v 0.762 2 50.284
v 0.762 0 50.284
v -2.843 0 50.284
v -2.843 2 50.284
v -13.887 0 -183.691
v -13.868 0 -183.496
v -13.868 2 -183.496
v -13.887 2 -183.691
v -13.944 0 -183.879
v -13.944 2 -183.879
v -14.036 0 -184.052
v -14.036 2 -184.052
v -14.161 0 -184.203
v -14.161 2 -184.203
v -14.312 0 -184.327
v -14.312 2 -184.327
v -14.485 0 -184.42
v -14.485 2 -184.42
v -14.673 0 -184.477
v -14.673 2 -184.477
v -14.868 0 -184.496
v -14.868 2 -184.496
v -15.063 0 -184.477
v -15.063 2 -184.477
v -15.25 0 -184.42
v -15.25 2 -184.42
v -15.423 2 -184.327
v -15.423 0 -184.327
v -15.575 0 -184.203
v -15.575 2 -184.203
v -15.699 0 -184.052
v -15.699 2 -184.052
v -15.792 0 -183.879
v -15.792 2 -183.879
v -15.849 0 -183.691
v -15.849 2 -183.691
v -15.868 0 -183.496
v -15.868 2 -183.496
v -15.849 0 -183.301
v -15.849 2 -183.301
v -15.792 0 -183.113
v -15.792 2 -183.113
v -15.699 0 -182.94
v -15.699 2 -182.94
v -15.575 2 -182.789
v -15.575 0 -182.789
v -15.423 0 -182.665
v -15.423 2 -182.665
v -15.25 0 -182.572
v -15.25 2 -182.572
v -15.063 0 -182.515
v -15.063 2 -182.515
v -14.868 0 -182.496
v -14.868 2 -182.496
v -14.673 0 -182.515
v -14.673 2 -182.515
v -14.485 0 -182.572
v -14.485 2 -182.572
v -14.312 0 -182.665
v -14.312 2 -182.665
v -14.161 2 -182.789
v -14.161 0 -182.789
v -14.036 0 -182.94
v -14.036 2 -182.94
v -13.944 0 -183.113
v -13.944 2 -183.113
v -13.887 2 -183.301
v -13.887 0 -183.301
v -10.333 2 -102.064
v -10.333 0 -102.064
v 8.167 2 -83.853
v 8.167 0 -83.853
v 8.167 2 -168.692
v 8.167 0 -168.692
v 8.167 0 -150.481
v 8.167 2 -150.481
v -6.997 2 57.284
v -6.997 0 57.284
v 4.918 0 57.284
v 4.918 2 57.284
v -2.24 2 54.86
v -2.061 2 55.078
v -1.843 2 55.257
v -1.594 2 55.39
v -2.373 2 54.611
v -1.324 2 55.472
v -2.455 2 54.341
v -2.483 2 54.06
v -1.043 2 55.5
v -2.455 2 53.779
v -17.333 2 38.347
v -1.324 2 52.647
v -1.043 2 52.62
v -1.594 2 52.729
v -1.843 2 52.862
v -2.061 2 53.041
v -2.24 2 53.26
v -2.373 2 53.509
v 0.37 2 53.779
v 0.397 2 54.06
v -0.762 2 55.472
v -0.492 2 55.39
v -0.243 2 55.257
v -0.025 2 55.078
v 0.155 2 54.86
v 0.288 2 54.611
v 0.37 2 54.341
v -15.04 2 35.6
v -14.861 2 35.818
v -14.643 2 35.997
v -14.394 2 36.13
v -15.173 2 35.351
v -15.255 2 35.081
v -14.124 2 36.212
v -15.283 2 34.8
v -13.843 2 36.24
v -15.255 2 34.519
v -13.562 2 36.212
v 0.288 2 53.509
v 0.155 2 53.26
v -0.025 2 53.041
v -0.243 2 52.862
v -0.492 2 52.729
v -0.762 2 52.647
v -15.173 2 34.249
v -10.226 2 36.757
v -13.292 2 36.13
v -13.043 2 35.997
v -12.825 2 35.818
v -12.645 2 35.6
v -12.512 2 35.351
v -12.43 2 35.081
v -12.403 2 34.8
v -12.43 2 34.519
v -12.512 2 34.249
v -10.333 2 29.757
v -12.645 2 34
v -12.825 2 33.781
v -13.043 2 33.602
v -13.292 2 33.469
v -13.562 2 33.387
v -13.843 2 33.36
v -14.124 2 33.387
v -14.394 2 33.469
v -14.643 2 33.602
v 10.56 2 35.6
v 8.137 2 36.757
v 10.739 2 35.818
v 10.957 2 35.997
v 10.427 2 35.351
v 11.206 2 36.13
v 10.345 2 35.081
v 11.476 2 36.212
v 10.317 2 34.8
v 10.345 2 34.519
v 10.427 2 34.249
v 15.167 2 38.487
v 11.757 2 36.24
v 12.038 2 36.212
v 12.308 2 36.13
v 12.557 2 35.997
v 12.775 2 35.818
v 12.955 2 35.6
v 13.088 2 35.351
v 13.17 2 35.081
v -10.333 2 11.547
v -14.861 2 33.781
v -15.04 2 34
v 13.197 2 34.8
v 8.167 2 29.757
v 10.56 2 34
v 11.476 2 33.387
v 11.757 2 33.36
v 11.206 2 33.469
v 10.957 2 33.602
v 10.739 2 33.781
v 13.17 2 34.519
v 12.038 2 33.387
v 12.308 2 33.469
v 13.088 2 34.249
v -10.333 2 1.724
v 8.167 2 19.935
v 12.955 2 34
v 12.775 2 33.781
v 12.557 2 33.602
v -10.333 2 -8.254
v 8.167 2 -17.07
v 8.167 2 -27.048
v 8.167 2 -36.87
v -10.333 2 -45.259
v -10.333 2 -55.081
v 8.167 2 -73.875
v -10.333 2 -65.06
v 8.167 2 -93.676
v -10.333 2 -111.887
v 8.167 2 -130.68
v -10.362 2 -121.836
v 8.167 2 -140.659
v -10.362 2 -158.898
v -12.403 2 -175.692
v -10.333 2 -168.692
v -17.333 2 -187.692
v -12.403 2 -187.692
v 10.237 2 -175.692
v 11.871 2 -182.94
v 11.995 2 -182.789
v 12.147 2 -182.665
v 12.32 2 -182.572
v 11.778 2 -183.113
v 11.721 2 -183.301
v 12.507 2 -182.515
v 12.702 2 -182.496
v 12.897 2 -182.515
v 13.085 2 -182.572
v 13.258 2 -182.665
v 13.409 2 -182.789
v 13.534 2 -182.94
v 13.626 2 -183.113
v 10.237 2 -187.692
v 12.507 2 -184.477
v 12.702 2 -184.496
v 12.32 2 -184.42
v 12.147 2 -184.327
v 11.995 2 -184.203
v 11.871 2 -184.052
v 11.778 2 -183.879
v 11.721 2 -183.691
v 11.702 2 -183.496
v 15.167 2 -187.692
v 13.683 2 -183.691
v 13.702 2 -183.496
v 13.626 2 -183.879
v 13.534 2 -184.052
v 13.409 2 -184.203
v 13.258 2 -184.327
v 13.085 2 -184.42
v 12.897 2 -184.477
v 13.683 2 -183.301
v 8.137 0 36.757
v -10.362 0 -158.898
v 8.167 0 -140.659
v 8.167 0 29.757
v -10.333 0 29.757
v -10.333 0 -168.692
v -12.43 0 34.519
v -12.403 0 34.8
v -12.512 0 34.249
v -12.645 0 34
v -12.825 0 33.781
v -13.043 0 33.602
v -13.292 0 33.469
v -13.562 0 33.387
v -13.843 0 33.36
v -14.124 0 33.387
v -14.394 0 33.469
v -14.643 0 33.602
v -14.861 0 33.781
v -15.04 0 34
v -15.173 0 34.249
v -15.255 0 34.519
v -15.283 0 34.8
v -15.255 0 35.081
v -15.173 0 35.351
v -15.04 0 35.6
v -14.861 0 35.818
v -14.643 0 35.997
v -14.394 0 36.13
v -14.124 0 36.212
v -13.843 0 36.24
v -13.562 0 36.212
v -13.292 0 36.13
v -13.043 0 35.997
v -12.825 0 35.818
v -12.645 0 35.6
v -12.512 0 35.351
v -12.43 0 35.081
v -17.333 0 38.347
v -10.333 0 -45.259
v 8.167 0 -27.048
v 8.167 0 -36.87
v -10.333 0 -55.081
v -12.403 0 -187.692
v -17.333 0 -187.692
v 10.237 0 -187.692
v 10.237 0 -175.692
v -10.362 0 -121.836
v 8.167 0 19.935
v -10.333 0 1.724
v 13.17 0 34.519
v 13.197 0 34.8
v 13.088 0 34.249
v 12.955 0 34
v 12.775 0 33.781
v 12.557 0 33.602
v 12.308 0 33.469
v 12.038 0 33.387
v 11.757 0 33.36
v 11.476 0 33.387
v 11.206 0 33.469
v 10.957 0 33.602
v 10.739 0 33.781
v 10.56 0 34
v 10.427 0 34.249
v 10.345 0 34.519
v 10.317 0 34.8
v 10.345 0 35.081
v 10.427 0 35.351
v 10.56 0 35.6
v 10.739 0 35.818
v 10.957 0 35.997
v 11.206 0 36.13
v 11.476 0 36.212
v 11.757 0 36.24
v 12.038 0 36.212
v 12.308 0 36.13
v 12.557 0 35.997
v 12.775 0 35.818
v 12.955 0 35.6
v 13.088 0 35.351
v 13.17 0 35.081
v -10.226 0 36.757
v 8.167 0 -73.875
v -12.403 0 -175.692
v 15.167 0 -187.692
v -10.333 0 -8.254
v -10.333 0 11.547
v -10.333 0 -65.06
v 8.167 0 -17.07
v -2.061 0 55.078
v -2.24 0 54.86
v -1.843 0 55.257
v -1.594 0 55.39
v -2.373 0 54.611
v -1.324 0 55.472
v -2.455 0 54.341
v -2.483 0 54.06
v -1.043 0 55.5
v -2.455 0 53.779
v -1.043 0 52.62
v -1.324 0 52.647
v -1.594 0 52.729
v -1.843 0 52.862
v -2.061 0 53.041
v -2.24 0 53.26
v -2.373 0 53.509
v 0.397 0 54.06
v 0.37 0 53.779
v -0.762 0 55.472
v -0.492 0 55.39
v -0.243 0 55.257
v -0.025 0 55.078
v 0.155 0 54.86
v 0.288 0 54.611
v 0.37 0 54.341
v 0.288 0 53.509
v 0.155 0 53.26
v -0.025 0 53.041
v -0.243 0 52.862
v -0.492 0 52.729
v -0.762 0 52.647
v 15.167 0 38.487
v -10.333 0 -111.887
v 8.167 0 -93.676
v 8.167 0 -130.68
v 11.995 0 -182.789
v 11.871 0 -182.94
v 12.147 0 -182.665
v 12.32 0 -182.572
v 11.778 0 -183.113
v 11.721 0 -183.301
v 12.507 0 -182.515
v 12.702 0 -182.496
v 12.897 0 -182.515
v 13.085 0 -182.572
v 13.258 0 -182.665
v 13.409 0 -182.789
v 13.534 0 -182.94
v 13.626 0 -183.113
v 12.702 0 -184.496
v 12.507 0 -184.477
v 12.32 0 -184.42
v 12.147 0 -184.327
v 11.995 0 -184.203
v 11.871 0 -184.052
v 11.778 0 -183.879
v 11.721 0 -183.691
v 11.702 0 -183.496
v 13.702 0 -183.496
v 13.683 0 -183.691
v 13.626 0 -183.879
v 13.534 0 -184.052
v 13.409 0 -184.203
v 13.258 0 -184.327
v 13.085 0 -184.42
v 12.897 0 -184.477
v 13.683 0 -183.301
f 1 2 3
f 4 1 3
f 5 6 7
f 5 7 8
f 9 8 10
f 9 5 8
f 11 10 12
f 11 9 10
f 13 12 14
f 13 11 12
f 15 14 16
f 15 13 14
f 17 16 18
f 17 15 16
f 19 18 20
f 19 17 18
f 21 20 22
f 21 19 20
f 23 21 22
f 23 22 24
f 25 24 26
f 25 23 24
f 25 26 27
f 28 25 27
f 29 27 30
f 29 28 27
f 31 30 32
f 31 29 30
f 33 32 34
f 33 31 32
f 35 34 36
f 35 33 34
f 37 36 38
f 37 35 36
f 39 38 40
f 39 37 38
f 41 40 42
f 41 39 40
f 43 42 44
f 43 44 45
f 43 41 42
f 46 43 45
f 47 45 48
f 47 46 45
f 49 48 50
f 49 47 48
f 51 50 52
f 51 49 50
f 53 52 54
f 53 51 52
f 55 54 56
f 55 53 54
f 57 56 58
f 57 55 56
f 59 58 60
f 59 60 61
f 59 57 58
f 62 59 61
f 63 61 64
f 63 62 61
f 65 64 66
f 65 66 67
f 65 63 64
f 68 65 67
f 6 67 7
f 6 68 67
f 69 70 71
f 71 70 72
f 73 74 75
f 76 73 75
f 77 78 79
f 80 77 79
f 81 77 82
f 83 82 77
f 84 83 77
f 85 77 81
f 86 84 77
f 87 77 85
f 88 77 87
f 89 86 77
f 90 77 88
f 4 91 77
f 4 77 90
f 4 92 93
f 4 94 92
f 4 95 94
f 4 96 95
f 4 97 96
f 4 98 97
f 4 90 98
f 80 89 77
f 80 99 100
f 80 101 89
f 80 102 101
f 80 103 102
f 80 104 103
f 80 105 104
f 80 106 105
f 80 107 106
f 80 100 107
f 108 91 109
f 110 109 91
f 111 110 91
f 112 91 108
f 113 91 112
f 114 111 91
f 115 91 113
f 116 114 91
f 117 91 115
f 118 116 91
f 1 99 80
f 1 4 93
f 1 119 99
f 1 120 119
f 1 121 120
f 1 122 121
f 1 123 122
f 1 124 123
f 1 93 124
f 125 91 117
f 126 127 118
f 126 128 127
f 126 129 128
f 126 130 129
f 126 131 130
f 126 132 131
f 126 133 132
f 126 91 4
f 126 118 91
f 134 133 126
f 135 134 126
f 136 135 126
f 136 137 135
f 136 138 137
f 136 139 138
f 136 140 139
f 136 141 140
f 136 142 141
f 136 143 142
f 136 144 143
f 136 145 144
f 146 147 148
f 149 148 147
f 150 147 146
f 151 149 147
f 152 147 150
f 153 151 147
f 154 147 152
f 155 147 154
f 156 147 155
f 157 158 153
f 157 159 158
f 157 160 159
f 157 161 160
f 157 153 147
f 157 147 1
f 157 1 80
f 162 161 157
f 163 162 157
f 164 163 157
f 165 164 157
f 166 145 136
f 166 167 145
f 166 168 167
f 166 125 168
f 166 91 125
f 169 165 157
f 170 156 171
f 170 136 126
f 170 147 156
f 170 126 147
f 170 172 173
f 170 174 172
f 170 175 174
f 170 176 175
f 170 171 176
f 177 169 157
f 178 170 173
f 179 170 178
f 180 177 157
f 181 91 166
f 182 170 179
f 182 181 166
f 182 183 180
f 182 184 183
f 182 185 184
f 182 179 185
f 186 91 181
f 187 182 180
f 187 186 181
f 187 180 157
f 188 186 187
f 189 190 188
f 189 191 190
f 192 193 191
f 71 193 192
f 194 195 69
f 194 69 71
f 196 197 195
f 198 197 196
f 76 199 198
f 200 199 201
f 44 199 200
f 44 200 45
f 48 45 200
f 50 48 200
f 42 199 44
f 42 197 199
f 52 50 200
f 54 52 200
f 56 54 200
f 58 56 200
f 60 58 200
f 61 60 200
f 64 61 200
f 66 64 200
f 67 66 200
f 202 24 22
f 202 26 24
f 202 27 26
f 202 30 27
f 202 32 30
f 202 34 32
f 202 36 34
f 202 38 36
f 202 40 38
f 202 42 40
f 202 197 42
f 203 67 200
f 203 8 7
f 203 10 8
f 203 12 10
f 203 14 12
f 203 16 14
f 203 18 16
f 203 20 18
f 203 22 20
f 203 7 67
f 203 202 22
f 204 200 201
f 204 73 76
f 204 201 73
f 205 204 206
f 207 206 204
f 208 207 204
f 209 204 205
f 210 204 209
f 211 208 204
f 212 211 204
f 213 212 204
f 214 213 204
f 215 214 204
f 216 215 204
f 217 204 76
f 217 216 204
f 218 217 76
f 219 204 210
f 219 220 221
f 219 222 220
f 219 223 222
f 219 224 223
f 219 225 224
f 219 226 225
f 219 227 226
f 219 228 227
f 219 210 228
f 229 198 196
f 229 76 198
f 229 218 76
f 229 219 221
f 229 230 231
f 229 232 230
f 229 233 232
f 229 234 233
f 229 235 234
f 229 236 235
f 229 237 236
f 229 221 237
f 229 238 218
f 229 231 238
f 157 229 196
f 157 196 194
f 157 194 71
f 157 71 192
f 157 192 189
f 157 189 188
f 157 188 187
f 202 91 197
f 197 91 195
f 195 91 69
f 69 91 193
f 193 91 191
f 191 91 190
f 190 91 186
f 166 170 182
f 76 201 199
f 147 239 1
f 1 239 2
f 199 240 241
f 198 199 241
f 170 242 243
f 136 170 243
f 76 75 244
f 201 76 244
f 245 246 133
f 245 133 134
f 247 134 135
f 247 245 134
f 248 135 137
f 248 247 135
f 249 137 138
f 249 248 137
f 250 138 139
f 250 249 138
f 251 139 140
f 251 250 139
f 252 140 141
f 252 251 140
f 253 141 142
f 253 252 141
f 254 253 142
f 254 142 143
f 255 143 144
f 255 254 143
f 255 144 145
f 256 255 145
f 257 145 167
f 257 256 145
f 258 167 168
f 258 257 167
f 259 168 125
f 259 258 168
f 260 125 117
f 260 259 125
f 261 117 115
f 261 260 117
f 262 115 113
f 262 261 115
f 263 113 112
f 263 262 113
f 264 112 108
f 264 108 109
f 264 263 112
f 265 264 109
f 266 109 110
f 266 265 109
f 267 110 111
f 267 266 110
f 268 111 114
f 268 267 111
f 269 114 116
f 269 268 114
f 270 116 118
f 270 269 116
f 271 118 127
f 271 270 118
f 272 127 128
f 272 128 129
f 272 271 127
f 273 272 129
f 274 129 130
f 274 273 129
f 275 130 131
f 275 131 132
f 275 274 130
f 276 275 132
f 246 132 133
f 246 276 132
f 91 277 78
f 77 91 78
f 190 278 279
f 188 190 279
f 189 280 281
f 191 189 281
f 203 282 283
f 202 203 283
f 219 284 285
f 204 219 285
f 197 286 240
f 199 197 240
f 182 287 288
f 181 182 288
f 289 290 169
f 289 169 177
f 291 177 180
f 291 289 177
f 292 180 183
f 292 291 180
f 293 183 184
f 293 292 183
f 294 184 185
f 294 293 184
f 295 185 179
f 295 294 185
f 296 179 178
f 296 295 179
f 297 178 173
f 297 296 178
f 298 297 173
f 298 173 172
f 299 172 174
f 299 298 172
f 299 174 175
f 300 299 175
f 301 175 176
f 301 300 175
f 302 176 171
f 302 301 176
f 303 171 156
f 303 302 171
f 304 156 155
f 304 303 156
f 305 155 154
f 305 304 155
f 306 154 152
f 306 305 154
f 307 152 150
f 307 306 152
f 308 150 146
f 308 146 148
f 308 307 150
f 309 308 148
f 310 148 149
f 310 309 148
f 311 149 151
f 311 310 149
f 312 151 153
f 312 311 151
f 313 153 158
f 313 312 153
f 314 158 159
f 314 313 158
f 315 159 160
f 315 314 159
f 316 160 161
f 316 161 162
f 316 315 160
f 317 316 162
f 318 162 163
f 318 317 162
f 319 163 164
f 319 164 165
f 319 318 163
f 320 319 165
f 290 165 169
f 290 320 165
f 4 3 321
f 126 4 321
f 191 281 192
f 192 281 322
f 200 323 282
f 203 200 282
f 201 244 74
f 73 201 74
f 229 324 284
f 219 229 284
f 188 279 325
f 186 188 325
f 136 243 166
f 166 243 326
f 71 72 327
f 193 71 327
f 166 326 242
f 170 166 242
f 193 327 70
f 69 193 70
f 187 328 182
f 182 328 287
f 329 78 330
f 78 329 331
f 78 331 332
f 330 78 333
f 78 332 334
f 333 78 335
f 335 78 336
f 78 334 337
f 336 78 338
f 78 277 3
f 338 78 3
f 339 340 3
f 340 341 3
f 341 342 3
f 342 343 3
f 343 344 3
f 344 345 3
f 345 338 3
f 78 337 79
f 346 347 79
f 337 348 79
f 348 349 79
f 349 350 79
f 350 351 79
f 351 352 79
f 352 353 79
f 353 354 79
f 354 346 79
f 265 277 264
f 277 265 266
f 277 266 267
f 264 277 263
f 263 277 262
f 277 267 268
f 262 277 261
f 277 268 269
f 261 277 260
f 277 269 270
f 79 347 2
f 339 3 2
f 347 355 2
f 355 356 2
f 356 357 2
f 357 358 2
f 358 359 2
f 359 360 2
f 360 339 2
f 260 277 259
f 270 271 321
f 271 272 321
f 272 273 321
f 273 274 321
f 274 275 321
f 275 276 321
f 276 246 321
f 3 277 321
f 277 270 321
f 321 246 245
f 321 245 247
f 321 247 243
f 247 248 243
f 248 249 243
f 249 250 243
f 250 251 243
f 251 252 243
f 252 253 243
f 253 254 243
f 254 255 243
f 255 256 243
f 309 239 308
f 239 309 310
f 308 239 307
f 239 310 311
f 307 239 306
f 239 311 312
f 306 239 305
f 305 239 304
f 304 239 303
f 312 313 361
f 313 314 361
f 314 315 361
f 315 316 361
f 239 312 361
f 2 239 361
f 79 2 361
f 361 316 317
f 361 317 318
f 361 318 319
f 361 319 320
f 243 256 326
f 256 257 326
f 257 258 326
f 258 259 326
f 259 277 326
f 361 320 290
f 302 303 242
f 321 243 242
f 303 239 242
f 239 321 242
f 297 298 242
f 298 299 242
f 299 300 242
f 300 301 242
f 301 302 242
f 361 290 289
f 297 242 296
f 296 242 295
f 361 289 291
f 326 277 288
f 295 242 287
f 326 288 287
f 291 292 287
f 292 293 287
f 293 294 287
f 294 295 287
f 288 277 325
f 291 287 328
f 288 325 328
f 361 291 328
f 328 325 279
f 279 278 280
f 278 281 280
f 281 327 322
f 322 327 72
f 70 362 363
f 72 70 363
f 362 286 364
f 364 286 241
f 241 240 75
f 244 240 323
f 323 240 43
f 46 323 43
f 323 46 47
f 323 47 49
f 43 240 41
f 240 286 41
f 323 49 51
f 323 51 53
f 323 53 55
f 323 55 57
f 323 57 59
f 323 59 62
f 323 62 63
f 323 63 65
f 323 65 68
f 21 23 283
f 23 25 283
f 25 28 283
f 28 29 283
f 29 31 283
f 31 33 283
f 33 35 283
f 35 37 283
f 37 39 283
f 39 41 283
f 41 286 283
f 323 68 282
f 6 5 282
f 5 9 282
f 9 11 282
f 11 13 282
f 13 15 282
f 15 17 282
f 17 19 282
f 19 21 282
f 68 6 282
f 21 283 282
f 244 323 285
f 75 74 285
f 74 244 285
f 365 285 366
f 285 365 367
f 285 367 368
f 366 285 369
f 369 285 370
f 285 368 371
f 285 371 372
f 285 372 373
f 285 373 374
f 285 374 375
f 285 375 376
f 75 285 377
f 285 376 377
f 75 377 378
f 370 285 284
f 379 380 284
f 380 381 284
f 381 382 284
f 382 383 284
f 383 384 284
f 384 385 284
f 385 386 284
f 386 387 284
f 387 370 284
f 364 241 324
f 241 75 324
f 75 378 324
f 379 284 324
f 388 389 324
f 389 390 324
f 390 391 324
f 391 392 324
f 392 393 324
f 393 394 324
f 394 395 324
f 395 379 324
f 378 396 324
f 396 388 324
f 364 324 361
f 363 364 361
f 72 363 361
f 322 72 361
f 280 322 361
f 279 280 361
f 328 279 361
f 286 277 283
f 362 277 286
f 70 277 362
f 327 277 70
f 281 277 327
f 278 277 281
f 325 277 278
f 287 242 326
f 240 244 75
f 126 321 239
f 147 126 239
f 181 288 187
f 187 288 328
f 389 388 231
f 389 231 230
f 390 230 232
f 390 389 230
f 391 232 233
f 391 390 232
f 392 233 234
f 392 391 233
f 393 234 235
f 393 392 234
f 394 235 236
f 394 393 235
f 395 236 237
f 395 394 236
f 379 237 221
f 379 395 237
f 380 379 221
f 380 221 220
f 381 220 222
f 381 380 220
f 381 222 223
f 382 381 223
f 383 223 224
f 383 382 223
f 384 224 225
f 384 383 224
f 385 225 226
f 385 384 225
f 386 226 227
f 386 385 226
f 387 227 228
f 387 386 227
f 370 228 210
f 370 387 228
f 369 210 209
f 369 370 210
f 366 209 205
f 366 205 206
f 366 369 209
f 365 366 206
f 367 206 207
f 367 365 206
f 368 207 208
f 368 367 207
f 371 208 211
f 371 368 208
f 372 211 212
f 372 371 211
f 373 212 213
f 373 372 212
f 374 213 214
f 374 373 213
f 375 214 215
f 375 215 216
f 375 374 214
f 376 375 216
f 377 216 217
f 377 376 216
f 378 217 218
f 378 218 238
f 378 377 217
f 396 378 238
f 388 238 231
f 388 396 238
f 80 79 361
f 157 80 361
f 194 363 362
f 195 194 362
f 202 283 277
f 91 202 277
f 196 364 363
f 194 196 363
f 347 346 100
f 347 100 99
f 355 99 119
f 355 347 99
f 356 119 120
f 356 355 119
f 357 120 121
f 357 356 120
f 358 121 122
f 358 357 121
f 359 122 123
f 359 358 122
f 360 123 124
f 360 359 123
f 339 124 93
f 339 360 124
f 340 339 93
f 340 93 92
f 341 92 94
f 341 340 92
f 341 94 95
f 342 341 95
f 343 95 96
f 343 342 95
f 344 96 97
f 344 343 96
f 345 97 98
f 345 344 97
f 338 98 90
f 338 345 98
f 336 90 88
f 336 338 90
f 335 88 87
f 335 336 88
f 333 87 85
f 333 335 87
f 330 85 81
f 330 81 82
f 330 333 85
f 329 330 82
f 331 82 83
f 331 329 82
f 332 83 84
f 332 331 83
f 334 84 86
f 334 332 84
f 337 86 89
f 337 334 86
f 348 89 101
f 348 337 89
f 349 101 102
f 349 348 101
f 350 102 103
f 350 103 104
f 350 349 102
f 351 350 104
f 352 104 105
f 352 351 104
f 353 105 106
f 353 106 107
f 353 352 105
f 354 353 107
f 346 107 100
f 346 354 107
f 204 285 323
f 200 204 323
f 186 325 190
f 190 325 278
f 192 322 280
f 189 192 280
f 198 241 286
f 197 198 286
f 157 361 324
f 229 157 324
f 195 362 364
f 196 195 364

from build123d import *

# Parameters (mm, degrees)
SKETCH1_R           = 1.44
SKETCH1_R_2         = 1
BOSS_EXTRUDE1_DEPTH = 2


with BuildPart() as part:
    # Sketch1 → Boss-Extrude1 (new body)
    with BuildSketch(Plane(origin=(0, 0, 0), x_dir=(1, 0, 0), z_dir=(0, 1, 0))):
        Polygon((-17.332807681, 117.69771489), (-17.332807681, -38.346866508), (-6.997005855, -57.284094596), (4.918028523, -57.284094596), (15.167192319, -38.486712582), (15.167192319, 187.692065716), (10.237192319, 187.692065716), (10.237192319, 175.692065716), (-12.402807681, 175.692065716), (-12.402807681, 187.692065716), (-17.332807681, 187.692065716), align=None)
        with Locations((-13.842807681, -34.799722329)):
            Circle(SKETCH1_R, mode=Mode.SUBTRACT)
        with Locations((-1.042807681, -54.059722329)):
            Circle(SKETCH1_R, mode=Mode.SUBTRACT)
        Polygon((-2.842807681, -50.284094596), (-10.225590468, -36.757379986), (8.137192319, -36.757379986), (0.761829434, -50.284094596), align=None, mode=Mode.SUBTRACT)
        Polygon((8.167192319, -29.757379986), (-10.332807681, -29.757379986), (-10.332807681, -11.546628322), align=None, mode=Mode.SUBTRACT)
        Polygon((8.167192319, -19.934969699), (-10.332807681, -1.724218034), (8.167192319, 17.069624543), align=None, mode=Mode.SUBTRACT)
        with Locations((11.757192319, -34.799722329)):
            Circle(SKETCH1_R, mode=Mode.SUBTRACT)
        Polygon((8.167192319, 27.048047931), (-10.332807681, 8.254205353), (-10.332807681, 45.258799595), align=None, mode=Mode.SUBTRACT)
        Polygon((8.167192319, 36.870458218), (-10.332807681, 55.081209882), (8.167192319, 73.87505246), align=None, mode=Mode.SUBTRACT)
        Polygon((8.167192319, 83.853475847), (-10.332807681, 65.05963327), (-10.332807681, 102.064227512), align=None, mode=Mode.SUBTRACT)
        with Locations((-14.867807681, 183.496000094)):
            Circle(SKETCH1_R_2, mode=Mode.SUBTRACT)
        Polygon((8.167192319, 140.658903764), (-10.361742255, 121.835667033), (-10.361742255, 158.89813761), align=None, mode=Mode.SUBTRACT)
        Polygon((8.167192319, 150.481314052), (-10.332807681, 168.692065716), (8.167192319, 168.692065716), align=None, mode=Mode.SUBTRACT)
        Polygon((8.167192319, 93.675886135), (-10.332807681, 111.886637799), (8.167192319, 130.680480377), align=None, mode=Mode.SUBTRACT)
        with Locations((12.702192319, 183.496000094)):
            Circle(SKETCH1_R_2, mode=Mode.SUBTRACT)
    extrude(amount=BOSS_EXTRUDE1_DEPTH)


solid = part.part
